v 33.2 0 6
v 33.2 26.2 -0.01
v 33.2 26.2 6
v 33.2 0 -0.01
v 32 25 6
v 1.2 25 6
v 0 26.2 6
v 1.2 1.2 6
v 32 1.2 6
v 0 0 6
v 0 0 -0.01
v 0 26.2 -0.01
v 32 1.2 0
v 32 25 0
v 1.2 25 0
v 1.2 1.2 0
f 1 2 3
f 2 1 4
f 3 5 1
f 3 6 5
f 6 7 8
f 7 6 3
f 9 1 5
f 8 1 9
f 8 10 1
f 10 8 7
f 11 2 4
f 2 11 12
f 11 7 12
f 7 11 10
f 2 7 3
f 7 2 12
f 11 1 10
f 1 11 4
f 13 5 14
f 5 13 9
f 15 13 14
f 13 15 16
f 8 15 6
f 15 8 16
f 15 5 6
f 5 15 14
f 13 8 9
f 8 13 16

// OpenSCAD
// file: ../Base/Rotation.scad
// Fischertechnik Box Foundation
// Geometry Helpers Rotation

include <PlacementOptions.scad>

// getRotatedSpace(space, rotation=NoRotation)
// Rotates the space dependent on the specified rotation

function getRotatedSpace(space, rotation=NoRotation) = [
    (rotation == Rotate90 || rotation == Rotate270) ? space.y : space.x,
    (rotation == Rotate90 || rotation == Rotate270) ? space.x : space.y
];

// Rotates the given space around the fixed left lower corner
// space = the space the children needs as width/depth list [width,depth]
// rotation = 0 Rotate0 degrees, 1 Rotate90 degrees, 2 Rotate180 degrees, 3 Rotate270 degrees (equivalent to -90)

module RotateFix(space, rotation=NoRotation) {
    dy = (rotation == Rotate0 || rotation == Rotate270) ? 0 :
        (rotation == Rotate90) ? space.x :
        space.y;
    dx = (rotation < Rotate180) ? 0 :
        (rotation == Rotate180) ? space.x :
        space.y;
    
    translate([dx, dy, 0])
        rotate([0, 0, rotations[rotation]])
            children();
}
// file: ../Base/Alignment.scad
// Fischertechnik Box Foundation
// Geometry Helpers Alignment

include <PlacementOptions.scad>

// getAlignedX(elementWidth, spaceWidth, align=AlignRight, offset=0)
// Gets the aligned X offset of an element with the given
// width in the given space.
// elementWidth = The width of the element to positon
// spaceWidth = The space where the element should be aligned
// align = 0 AlignLeft, 1 AlignCenter, 2 AlignRight
// offset = an optional offset from the aligned position. When
// aligned left or centered, then positive values are in X direction.
// When aligned right then positive values are in negative X direction.

function getAlignedX(elementWidth, spaceWidth, align=AlignRight, offset=0) =
    (align == AlignLeft) ?
        offset :
        ((align == AlignCenter) ?
        (spaceWidth - elementWidth)/2 + offset :
        spaceWidth - offset - elementWidth);

// getAlignedY(elementDepth, spaceDepth, align=AlignTop, offset=0)
// Gets the aligned Y offset of an element with the given
// depth in the given space.
// elementDepth = The depth of the element to positon
// spaceDepth = The space where the element should be aligned
// align = 0 AlignBottom, 1 AlignCenter, 2 AlignTop
// offset = an optional offset from the aligned position. When
// aligned bottom or centered, then positive values are in Y direction.
// When aligned top then positive values are in negative Y direction.

function getAlignedY(elementDepth, spaceDepth, align=AlignTop, offset=0) =
    (align == AlignBottom) ?
        offset :
        ((align == AlignCenter) ?
        (spaceDepth - elementDepth)/2 + offset :
        spaceDepth - offset - elementDepth);
// file: ../Base/PlacementOptions.scad
// Fischertechnik Box Foundation
// Placement Options

// Alignment
NoAlign = 0;
AlignLeft = 1;
AlignBottom = 2;
AlignCenter = 3;
AlignRight = 4;
AlignTop = 5;

// Element rotation degree steps
rotations = [0, -90, -180, -270];

// Rotation
NoRotation = 0;
Rotate0 = 0;
Rotate90 = 1;
Rotate180 = 2;
Rotate270 = 3;

// Docking (seen from above)
NoDock = -1;
DockLeft = 0;
DockTop = 1;
DockRight = 2;
DockCorner = 2;
DockBottom = 3;

// Web corners
LowerLeft = 0;
UpperLeft = 1;
UpperRight = 2;
LowerRight = 3;

// Web position relative to corner
LeftOfCorner = 0;
RightOfCorner = 1;
// file: ../Base/Boxes.scad
// Fischertechnik Box Foundation
// Pre-designed Boxes

use <Constants.scad>

include <PlacementOptions.scad>

box190Width = 190;
box190Depth = 130;
box130Width = 130;
box130Depth = 95;

// Values are from an original ec3 box
topBottomDifference = 1.5;
outerHeight = 40;
baseThickness = 1.8;
innerHeight = outerHeight - baseThickness;
stackExcess = 5.7;
radius = 3.5;
wallThickness = 1.5;
tolerance = 0.2;

boxWallThickness = wallThickness;
boxBaseThickness = baseThickness;
boxWebWidth = 3.0;

// getBoxWallThickness()
// Gets the wall thickness of a Fischertechnik Box
function getBoxWallThickness() = boxWallThickness;

// getBoxUsageHeight(height = 38.2)
// Gets the usable height of a Fischertechnik box
// height = Outer height of the box from the bottom to the upper edge.
function getBoxUsageHeight(height = outerHeight) = height - baseThickness - stackExcess;

// getBoxInnerHeight()
// Gets the inner height of a Fischertechnik box, including the stack excess
function getBoxInnerHeight() = innerHeight;

// getBoxBaseThickness()
// Gets the thickness of the Fischertechnik box base.
function getBoxBaseThickness() = boxBaseThickness;

// getBoxWebWidth()
// Gets the width of a box web
function getBoxWebWidth() = boxWebWidth;

// getBox190Space()
// Gets the usable inner space of a Box 190 as an x/y-list
function getBox190Space() = [
    box190Width - 2*getBoxWallThickness() - topBottomDifference, 
    box190Depth - 2*getBoxWallThickness() - topBottomDifference ];

// RoundedCornerPlate(width, depth, height, radius)
// Creates a body plate with rounded corners for a box. Used
// also to create the complete box with the hull module.
// width = Width of the plate
// depth = depth of the plate 
// height = thickness of the plate
// radius = radius of the rounded corner
module RoundedCornerPlate(width, depth, height, radius) {
    translate([radius, radius])
    hull() {
        w = width-2*radius;
        d = depth-2*radius;
        cube([w, d, height]);
        cylinder(height, r=radius, $fn=getFragments());
        translate([w, 0])
            cylinder(height, r=radius, $fn=getFragments());
        translate([w, d])
            cylinder(height, r=radius, $fn=getFragments());
        translate([0, d])
            cylinder(height, r=radius, $fn=getFragments());
    }
}

// BoxBase(width, depth)
// Creates an empty stackable Fischertechnik compatible box
// width = Outer width of the box (190, 130, ...)
// depth = Outer depth of the box (130, 95, ...)

module BoxBase(width, depth, height=outerHeight) {    
    thinPlate = 0.01;

    innerHeight = height - baseThickness;    
    
    module Body(tolerance=tolerance) {
        hull() {
            // Bottom with tolerance to fit into the original boxes when stacked
            translate([-wallThickness+tolerance, -wallThickness+tolerance, -baseThickness])
                RoundedCornerPlate(width-topBottomDifference-2*tolerance, depth-topBottomDifference-2*tolerance, thinPlate, radius);
            
            // Top
            translate([-wallThickness-topBottomDifference/2, -wallThickness-topBottomDifference/2, innerHeight-thinPlate])
                RoundedCornerPlate(width, depth, thinPlate, radius);
         }
    }

    module Cutoff() {
        hull() {
            coWidth = width - 2*wallThickness;
            coDepth = depth - 2*wallThickness;
            
            // Bottom
            RoundedCornerPlate(coWidth-topBottomDifference, coDepth-topBottomDifference, thinPlate, radius);

            // Top
            translate([-topBottomDifference/2, -topBottomDifference/2, innerHeight+thinPlate]) 
                RoundedCornerPlate(coWidth, coDepth, thinPlate, radius);
        }
    }
    
    difference() {        
        Body();
        Cutoff();
        stackOffset = innerHeight - stackExcess;
        translate([0, 0, stackOffset + baseThickness])
            Body(tolerance=0);
    }
}

// Creates the Fischertechnik empty box 130x190 mm and places it at position 0,0
// 190x130 are the outer sizes, the inner space is slightly smaller. Use getBox190Space() to get the inner sizes.
// The box is positioned that the usable inner space is at the 0,0,0 position.

module Box190() {
    BoxBase(box190Width, box190Depth);
}

// Gets the usable inner space of a Box 130 as an x/y-list
function getBox130Space() = [
    box130Width - 2*getBoxWallThickness() - topBottomDifference, 
    box130Depth - 2*getBoxWallThickness() - topBottomDifference ];

// Creates the Fischertechnik empty box 95x130 mm and places it at position 0,0
// 190x130 are the outer sizes, the inner space is slightly smaller. Use getBox190Space() to get the inner sizes.
// The box is positioned that the usable inner space is at the 0,0,0 position.

module Box130() {
    BoxBase(box130Width, box130Depth);
}

// Creates a web at the specified box walls
// corner 0 = LowerLeft, 1 = UpperLeft, 2 = UpperRight, 3 = LowerRight
// side 0 = LeftOfCorner, 1 = RightOfCorner
// distance = Distance in mm from the corner
// boxSpace = inner width and depth of the box (default: Box 190)
// webWidth = length of the web (default is 3 mms)
// webThickness = thickness of the web (default is 1 mm)
// height = Height of the web (standard is getBoxUsageHeight())

module BoxWeb(corner, side, distance, boxSpace=getBox190Space(), webWidth=getBoxWebWidth(), webThickness=1.0, height=getBoxUsageHeight()) {
    sink = getBoxWallThickness()/2;

    width = (corner % 2 == 0) ? 
            (side == LeftOfCorner ? webWidth : webThickness) :
            (side == LeftOfCorner ? webThickness : webWidth);

    depth = (corner % 2 == 0) ? 
            (side == RightOfCorner ? webWidth : webThickness) :
            (side == RightOfCorner ? webThickness : webWidth);
    
    xDiff = corner == LowerLeft ? 
                (side == LeftOfCorner ? -sink : distance) :
            (corner == UpperLeft ?                
                (side == LeftOfCorner ? distance : -sink) :
            (corner == UpperRight ?
                (side == LeftOfCorner ? boxSpace.x-webWidth+sink : boxSpace.x-distance-webThickness) :
                (side == LeftOfCorner ? boxSpace.x-distance-webThickness: boxSpace.x-webWidth+sink)));

    yDiff = corner == LowerLeft ? 
                (side == RightOfCorner ? -sink : distance) :
            (corner == UpperLeft ?
                (side == RightOfCorner ? boxSpace.y-distance-webThickness : boxSpace.y-webWidth+sink) :
            (corner == UpperRight ?
                (side == RightOfCorner ? boxSpace.y-webWidth+sink : boxSpace.y-distance-webThickness) :
                (side == RightOfCorner ? distance : -sink)));
    
    translate([xDiff, yDiff, -getExcess()])
        cube([width, depth, height + 2*getExcess()]);
}
// file: ../Base/Placement.scad
// Fischertechnik Box Foundation
// Geometry Helpers Placement

use <Constants.scad>
use <Alignment.scad>
use <Rotation.scad>
use <Boxes.scad>

include <PlacementOptions.scad>

// Place(x=0, y=0, elementSpace=[0,0], alignX=AlignLeft, alignY=AlignBottom, rotation=Rotate0, boxSpace=getBox190Space())
// Places the child at the specified position
// y = Y-Position. This is a relative position when an X aligment is specified.
// x = X-Position. This is a relative position when an Y aligment is specified.
// elementSpace = space of the element to be placed [x,y]
// alignX = -1=NoAlign, 0 AlignLeft, 1 AlignCenter, 3 AlignRight (elementSpace and boxSpace required!)
// alignY = -1=NoAlign, 2 AlignBottom, 1 AlignCenter, 4 AlignTop (elementSpace and boxSpace required!)
// rotation = 0 Rotate0 0 degrees, 1 Rotate90 90 degrees, 
// 2 Rotate180 180 degrees, 3 Rotate270 270 degrees (equivalent to -90)
// boxSpace = Inner space of the box where the placement occurs [x,y] - default is Box 190x130 inner space

module Place(x=0, y=0, elementSpace=[0,0], 
  alignX=AlignLeft, alignY=AlignBottom, 
  rotation=NoRotation, boxSpace=getBox190Space()) {

    module Position(x, y, space, rotation=Rotate0) {
        translate([x, y, 0])
            RotateFix(space, rotation)
                children();
    }

    space = getRotatedSpace(elementSpace, rotation);
    alignedX = getAlignedX(space.x, boxSpace.x, alignX, x);
    alignedY = getAlignedY(space.y, boxSpace.y, alignY, y);
    Position(alignedX, alignedY, elementSpace, rotation)
        children();
}

// Center(space=getBox130Space(), elementSpace=[0,0])
// space = Space where the children is centered. For cylinder use centered=true and no elementSpace.
// elementSpace = space of the element to be centered [x,y]

module Center(space=getBox190Space(), elementSpace=[0,0]) {
    Place(elementSpace=elementSpace, boxSpace=space, alignX=AlignCenter, alignY=AlignCenter)
        children();
}

// CenterHorizontal(width=0, y=0, offset=0, space=getBox130Space())
// width = Width of the element to be placed.
// y = Y position of the element
// offset = Offset from the center position (negative will be left of the center)
// space = Space where the element is placed

module CenterHorizontal(width=0, y=0, offset=0, space=getBox190Space()) {
    Place(x=offset, y=y, elementSpace=[width, 0], boxSpace=space, alignX=AlignCenter)
        children(0);
}

// CenterVertical(depth=0, x=0, offset=0, space=getBox130Space())
// depth = Depth of the element to be placed.
// x = X position of the element
// offset = Offset from the center position (negative will be down of the center)
// space = Space where the element is placed

module CenterVertical(depth=0, x=0, offset=0, space=getBox190Space()) {
    Place(x=x, y=offset, elementSpace=[0, depth], boxSpace=space, alignY=AlignCenter)
        children(0);
}

// getIsVertical(align)
// True if the specified alignment needs a vertical orientation for a divider (AlignRight, AlignLeft)

function getIsVertical(align) = (align == AlignRight || align == AlignLeft);

// getIsHorizontal(align)
// True if the specified alignment needs a horizontal orientation for a divider (AlignTop, AlignBottom)

function getIsHorizontal(align) = (align == AlignTop || align == AlignBottom);
// file: ../Base/Constants.scad
// Fischertechnik Box Foundation
// Constants

// Constant values necessary for multiple elements

// Base constants
dividerThickness = 1.2;
excess = 0.01;
fragments = 90;
tolerance = 0.8;

// Gets the thickness of a divider 
function getDividerThickness() = dividerThickness;

// Gets the excess that is used to merge walls into each other
function getExcess() = excess;

// Gets amount of fragments of a cylinder
function getFragments() = fragments;

// Gets the inner tolerance of a frame to each side
function getTolerance() = tolerance;


// Fischertechnik specific constants
axisDiameter = 4;
axisBottomDiameter = axisDiameter + 1;
axisTolerance = 0.2;

// Gets axis diameter of Fischertechnik axis
function getAxisDiameter() = axisDiameter;

// Gets axis diameter tolerance (subtracted for element axis)
function getAxisTolerance() = axisTolerance;

// Gets the axis diameter for standing axis
function getStandAxisDiameter() = getAxisDiameter() - getAxisTolerance();

// Gets axis bottom diameter for thicker part at the bottom
function getAxisBottomDiameter() = axisBottomDiameter;

standardEdgeDistance = 2.5;
standardWebDistance = 11.5;
standardCornerLength = 15;

// gets the standard distance to the wall of the box for dockable frames with webs
function getStandardEdgeDistance() = standardEdgeDistance;

// gets the standard distance of each web to the corner of the dockable frame
function getStandardWebDistance() = standardWebDistance;

// gets the standard length of the corner walls of a dockable frame
function getStandardCornerLength() = standardCornerLength;

tubeWallFactor = 0.8;

// gets the wall thickness of a tube.
function getTubeWallThickness() = tubeWallFactor * getDividerThickness();

smallPartsFrameHeight = 20;

// gets the frame height for docked small parts boxes.
function getSmallPartsFrameHeight() = smallPartsFrameHeight;

hubRingDiameter = 19.5;
hubRingLevelDiameter = 21;

// gets the diameter of a tube matching the inner ring of a wheel
function getHubRingDiameter() = hubRingDiameter;

// gets the diameter of a hub tube with a thicker diameter
function getHubRingLevelDiameter() = hubRingLevelDiameter;
// main file
// Fischertechnik Box Library
// Frame for lifting gear
// 37263, 37268, 37272, 75067

use <../ModelBase/Simple.scad>

/* [Hidden] */
width = 30;
depth = 23;
height = 6;

volume = [width, depth, height];

// getFrameLiftingGearSpace()
// Gets the space the frame for the lifting gear needs

function getFrameLiftingGearSpace() = getFrameOuterVolume(volume);

// FrameLiftingGear()
// Creates a frame for a lifting gear

module FrameLiftingGear() {
    Frame(volume);
}

// Test
color("lightgray")
FrameLiftingGear();
